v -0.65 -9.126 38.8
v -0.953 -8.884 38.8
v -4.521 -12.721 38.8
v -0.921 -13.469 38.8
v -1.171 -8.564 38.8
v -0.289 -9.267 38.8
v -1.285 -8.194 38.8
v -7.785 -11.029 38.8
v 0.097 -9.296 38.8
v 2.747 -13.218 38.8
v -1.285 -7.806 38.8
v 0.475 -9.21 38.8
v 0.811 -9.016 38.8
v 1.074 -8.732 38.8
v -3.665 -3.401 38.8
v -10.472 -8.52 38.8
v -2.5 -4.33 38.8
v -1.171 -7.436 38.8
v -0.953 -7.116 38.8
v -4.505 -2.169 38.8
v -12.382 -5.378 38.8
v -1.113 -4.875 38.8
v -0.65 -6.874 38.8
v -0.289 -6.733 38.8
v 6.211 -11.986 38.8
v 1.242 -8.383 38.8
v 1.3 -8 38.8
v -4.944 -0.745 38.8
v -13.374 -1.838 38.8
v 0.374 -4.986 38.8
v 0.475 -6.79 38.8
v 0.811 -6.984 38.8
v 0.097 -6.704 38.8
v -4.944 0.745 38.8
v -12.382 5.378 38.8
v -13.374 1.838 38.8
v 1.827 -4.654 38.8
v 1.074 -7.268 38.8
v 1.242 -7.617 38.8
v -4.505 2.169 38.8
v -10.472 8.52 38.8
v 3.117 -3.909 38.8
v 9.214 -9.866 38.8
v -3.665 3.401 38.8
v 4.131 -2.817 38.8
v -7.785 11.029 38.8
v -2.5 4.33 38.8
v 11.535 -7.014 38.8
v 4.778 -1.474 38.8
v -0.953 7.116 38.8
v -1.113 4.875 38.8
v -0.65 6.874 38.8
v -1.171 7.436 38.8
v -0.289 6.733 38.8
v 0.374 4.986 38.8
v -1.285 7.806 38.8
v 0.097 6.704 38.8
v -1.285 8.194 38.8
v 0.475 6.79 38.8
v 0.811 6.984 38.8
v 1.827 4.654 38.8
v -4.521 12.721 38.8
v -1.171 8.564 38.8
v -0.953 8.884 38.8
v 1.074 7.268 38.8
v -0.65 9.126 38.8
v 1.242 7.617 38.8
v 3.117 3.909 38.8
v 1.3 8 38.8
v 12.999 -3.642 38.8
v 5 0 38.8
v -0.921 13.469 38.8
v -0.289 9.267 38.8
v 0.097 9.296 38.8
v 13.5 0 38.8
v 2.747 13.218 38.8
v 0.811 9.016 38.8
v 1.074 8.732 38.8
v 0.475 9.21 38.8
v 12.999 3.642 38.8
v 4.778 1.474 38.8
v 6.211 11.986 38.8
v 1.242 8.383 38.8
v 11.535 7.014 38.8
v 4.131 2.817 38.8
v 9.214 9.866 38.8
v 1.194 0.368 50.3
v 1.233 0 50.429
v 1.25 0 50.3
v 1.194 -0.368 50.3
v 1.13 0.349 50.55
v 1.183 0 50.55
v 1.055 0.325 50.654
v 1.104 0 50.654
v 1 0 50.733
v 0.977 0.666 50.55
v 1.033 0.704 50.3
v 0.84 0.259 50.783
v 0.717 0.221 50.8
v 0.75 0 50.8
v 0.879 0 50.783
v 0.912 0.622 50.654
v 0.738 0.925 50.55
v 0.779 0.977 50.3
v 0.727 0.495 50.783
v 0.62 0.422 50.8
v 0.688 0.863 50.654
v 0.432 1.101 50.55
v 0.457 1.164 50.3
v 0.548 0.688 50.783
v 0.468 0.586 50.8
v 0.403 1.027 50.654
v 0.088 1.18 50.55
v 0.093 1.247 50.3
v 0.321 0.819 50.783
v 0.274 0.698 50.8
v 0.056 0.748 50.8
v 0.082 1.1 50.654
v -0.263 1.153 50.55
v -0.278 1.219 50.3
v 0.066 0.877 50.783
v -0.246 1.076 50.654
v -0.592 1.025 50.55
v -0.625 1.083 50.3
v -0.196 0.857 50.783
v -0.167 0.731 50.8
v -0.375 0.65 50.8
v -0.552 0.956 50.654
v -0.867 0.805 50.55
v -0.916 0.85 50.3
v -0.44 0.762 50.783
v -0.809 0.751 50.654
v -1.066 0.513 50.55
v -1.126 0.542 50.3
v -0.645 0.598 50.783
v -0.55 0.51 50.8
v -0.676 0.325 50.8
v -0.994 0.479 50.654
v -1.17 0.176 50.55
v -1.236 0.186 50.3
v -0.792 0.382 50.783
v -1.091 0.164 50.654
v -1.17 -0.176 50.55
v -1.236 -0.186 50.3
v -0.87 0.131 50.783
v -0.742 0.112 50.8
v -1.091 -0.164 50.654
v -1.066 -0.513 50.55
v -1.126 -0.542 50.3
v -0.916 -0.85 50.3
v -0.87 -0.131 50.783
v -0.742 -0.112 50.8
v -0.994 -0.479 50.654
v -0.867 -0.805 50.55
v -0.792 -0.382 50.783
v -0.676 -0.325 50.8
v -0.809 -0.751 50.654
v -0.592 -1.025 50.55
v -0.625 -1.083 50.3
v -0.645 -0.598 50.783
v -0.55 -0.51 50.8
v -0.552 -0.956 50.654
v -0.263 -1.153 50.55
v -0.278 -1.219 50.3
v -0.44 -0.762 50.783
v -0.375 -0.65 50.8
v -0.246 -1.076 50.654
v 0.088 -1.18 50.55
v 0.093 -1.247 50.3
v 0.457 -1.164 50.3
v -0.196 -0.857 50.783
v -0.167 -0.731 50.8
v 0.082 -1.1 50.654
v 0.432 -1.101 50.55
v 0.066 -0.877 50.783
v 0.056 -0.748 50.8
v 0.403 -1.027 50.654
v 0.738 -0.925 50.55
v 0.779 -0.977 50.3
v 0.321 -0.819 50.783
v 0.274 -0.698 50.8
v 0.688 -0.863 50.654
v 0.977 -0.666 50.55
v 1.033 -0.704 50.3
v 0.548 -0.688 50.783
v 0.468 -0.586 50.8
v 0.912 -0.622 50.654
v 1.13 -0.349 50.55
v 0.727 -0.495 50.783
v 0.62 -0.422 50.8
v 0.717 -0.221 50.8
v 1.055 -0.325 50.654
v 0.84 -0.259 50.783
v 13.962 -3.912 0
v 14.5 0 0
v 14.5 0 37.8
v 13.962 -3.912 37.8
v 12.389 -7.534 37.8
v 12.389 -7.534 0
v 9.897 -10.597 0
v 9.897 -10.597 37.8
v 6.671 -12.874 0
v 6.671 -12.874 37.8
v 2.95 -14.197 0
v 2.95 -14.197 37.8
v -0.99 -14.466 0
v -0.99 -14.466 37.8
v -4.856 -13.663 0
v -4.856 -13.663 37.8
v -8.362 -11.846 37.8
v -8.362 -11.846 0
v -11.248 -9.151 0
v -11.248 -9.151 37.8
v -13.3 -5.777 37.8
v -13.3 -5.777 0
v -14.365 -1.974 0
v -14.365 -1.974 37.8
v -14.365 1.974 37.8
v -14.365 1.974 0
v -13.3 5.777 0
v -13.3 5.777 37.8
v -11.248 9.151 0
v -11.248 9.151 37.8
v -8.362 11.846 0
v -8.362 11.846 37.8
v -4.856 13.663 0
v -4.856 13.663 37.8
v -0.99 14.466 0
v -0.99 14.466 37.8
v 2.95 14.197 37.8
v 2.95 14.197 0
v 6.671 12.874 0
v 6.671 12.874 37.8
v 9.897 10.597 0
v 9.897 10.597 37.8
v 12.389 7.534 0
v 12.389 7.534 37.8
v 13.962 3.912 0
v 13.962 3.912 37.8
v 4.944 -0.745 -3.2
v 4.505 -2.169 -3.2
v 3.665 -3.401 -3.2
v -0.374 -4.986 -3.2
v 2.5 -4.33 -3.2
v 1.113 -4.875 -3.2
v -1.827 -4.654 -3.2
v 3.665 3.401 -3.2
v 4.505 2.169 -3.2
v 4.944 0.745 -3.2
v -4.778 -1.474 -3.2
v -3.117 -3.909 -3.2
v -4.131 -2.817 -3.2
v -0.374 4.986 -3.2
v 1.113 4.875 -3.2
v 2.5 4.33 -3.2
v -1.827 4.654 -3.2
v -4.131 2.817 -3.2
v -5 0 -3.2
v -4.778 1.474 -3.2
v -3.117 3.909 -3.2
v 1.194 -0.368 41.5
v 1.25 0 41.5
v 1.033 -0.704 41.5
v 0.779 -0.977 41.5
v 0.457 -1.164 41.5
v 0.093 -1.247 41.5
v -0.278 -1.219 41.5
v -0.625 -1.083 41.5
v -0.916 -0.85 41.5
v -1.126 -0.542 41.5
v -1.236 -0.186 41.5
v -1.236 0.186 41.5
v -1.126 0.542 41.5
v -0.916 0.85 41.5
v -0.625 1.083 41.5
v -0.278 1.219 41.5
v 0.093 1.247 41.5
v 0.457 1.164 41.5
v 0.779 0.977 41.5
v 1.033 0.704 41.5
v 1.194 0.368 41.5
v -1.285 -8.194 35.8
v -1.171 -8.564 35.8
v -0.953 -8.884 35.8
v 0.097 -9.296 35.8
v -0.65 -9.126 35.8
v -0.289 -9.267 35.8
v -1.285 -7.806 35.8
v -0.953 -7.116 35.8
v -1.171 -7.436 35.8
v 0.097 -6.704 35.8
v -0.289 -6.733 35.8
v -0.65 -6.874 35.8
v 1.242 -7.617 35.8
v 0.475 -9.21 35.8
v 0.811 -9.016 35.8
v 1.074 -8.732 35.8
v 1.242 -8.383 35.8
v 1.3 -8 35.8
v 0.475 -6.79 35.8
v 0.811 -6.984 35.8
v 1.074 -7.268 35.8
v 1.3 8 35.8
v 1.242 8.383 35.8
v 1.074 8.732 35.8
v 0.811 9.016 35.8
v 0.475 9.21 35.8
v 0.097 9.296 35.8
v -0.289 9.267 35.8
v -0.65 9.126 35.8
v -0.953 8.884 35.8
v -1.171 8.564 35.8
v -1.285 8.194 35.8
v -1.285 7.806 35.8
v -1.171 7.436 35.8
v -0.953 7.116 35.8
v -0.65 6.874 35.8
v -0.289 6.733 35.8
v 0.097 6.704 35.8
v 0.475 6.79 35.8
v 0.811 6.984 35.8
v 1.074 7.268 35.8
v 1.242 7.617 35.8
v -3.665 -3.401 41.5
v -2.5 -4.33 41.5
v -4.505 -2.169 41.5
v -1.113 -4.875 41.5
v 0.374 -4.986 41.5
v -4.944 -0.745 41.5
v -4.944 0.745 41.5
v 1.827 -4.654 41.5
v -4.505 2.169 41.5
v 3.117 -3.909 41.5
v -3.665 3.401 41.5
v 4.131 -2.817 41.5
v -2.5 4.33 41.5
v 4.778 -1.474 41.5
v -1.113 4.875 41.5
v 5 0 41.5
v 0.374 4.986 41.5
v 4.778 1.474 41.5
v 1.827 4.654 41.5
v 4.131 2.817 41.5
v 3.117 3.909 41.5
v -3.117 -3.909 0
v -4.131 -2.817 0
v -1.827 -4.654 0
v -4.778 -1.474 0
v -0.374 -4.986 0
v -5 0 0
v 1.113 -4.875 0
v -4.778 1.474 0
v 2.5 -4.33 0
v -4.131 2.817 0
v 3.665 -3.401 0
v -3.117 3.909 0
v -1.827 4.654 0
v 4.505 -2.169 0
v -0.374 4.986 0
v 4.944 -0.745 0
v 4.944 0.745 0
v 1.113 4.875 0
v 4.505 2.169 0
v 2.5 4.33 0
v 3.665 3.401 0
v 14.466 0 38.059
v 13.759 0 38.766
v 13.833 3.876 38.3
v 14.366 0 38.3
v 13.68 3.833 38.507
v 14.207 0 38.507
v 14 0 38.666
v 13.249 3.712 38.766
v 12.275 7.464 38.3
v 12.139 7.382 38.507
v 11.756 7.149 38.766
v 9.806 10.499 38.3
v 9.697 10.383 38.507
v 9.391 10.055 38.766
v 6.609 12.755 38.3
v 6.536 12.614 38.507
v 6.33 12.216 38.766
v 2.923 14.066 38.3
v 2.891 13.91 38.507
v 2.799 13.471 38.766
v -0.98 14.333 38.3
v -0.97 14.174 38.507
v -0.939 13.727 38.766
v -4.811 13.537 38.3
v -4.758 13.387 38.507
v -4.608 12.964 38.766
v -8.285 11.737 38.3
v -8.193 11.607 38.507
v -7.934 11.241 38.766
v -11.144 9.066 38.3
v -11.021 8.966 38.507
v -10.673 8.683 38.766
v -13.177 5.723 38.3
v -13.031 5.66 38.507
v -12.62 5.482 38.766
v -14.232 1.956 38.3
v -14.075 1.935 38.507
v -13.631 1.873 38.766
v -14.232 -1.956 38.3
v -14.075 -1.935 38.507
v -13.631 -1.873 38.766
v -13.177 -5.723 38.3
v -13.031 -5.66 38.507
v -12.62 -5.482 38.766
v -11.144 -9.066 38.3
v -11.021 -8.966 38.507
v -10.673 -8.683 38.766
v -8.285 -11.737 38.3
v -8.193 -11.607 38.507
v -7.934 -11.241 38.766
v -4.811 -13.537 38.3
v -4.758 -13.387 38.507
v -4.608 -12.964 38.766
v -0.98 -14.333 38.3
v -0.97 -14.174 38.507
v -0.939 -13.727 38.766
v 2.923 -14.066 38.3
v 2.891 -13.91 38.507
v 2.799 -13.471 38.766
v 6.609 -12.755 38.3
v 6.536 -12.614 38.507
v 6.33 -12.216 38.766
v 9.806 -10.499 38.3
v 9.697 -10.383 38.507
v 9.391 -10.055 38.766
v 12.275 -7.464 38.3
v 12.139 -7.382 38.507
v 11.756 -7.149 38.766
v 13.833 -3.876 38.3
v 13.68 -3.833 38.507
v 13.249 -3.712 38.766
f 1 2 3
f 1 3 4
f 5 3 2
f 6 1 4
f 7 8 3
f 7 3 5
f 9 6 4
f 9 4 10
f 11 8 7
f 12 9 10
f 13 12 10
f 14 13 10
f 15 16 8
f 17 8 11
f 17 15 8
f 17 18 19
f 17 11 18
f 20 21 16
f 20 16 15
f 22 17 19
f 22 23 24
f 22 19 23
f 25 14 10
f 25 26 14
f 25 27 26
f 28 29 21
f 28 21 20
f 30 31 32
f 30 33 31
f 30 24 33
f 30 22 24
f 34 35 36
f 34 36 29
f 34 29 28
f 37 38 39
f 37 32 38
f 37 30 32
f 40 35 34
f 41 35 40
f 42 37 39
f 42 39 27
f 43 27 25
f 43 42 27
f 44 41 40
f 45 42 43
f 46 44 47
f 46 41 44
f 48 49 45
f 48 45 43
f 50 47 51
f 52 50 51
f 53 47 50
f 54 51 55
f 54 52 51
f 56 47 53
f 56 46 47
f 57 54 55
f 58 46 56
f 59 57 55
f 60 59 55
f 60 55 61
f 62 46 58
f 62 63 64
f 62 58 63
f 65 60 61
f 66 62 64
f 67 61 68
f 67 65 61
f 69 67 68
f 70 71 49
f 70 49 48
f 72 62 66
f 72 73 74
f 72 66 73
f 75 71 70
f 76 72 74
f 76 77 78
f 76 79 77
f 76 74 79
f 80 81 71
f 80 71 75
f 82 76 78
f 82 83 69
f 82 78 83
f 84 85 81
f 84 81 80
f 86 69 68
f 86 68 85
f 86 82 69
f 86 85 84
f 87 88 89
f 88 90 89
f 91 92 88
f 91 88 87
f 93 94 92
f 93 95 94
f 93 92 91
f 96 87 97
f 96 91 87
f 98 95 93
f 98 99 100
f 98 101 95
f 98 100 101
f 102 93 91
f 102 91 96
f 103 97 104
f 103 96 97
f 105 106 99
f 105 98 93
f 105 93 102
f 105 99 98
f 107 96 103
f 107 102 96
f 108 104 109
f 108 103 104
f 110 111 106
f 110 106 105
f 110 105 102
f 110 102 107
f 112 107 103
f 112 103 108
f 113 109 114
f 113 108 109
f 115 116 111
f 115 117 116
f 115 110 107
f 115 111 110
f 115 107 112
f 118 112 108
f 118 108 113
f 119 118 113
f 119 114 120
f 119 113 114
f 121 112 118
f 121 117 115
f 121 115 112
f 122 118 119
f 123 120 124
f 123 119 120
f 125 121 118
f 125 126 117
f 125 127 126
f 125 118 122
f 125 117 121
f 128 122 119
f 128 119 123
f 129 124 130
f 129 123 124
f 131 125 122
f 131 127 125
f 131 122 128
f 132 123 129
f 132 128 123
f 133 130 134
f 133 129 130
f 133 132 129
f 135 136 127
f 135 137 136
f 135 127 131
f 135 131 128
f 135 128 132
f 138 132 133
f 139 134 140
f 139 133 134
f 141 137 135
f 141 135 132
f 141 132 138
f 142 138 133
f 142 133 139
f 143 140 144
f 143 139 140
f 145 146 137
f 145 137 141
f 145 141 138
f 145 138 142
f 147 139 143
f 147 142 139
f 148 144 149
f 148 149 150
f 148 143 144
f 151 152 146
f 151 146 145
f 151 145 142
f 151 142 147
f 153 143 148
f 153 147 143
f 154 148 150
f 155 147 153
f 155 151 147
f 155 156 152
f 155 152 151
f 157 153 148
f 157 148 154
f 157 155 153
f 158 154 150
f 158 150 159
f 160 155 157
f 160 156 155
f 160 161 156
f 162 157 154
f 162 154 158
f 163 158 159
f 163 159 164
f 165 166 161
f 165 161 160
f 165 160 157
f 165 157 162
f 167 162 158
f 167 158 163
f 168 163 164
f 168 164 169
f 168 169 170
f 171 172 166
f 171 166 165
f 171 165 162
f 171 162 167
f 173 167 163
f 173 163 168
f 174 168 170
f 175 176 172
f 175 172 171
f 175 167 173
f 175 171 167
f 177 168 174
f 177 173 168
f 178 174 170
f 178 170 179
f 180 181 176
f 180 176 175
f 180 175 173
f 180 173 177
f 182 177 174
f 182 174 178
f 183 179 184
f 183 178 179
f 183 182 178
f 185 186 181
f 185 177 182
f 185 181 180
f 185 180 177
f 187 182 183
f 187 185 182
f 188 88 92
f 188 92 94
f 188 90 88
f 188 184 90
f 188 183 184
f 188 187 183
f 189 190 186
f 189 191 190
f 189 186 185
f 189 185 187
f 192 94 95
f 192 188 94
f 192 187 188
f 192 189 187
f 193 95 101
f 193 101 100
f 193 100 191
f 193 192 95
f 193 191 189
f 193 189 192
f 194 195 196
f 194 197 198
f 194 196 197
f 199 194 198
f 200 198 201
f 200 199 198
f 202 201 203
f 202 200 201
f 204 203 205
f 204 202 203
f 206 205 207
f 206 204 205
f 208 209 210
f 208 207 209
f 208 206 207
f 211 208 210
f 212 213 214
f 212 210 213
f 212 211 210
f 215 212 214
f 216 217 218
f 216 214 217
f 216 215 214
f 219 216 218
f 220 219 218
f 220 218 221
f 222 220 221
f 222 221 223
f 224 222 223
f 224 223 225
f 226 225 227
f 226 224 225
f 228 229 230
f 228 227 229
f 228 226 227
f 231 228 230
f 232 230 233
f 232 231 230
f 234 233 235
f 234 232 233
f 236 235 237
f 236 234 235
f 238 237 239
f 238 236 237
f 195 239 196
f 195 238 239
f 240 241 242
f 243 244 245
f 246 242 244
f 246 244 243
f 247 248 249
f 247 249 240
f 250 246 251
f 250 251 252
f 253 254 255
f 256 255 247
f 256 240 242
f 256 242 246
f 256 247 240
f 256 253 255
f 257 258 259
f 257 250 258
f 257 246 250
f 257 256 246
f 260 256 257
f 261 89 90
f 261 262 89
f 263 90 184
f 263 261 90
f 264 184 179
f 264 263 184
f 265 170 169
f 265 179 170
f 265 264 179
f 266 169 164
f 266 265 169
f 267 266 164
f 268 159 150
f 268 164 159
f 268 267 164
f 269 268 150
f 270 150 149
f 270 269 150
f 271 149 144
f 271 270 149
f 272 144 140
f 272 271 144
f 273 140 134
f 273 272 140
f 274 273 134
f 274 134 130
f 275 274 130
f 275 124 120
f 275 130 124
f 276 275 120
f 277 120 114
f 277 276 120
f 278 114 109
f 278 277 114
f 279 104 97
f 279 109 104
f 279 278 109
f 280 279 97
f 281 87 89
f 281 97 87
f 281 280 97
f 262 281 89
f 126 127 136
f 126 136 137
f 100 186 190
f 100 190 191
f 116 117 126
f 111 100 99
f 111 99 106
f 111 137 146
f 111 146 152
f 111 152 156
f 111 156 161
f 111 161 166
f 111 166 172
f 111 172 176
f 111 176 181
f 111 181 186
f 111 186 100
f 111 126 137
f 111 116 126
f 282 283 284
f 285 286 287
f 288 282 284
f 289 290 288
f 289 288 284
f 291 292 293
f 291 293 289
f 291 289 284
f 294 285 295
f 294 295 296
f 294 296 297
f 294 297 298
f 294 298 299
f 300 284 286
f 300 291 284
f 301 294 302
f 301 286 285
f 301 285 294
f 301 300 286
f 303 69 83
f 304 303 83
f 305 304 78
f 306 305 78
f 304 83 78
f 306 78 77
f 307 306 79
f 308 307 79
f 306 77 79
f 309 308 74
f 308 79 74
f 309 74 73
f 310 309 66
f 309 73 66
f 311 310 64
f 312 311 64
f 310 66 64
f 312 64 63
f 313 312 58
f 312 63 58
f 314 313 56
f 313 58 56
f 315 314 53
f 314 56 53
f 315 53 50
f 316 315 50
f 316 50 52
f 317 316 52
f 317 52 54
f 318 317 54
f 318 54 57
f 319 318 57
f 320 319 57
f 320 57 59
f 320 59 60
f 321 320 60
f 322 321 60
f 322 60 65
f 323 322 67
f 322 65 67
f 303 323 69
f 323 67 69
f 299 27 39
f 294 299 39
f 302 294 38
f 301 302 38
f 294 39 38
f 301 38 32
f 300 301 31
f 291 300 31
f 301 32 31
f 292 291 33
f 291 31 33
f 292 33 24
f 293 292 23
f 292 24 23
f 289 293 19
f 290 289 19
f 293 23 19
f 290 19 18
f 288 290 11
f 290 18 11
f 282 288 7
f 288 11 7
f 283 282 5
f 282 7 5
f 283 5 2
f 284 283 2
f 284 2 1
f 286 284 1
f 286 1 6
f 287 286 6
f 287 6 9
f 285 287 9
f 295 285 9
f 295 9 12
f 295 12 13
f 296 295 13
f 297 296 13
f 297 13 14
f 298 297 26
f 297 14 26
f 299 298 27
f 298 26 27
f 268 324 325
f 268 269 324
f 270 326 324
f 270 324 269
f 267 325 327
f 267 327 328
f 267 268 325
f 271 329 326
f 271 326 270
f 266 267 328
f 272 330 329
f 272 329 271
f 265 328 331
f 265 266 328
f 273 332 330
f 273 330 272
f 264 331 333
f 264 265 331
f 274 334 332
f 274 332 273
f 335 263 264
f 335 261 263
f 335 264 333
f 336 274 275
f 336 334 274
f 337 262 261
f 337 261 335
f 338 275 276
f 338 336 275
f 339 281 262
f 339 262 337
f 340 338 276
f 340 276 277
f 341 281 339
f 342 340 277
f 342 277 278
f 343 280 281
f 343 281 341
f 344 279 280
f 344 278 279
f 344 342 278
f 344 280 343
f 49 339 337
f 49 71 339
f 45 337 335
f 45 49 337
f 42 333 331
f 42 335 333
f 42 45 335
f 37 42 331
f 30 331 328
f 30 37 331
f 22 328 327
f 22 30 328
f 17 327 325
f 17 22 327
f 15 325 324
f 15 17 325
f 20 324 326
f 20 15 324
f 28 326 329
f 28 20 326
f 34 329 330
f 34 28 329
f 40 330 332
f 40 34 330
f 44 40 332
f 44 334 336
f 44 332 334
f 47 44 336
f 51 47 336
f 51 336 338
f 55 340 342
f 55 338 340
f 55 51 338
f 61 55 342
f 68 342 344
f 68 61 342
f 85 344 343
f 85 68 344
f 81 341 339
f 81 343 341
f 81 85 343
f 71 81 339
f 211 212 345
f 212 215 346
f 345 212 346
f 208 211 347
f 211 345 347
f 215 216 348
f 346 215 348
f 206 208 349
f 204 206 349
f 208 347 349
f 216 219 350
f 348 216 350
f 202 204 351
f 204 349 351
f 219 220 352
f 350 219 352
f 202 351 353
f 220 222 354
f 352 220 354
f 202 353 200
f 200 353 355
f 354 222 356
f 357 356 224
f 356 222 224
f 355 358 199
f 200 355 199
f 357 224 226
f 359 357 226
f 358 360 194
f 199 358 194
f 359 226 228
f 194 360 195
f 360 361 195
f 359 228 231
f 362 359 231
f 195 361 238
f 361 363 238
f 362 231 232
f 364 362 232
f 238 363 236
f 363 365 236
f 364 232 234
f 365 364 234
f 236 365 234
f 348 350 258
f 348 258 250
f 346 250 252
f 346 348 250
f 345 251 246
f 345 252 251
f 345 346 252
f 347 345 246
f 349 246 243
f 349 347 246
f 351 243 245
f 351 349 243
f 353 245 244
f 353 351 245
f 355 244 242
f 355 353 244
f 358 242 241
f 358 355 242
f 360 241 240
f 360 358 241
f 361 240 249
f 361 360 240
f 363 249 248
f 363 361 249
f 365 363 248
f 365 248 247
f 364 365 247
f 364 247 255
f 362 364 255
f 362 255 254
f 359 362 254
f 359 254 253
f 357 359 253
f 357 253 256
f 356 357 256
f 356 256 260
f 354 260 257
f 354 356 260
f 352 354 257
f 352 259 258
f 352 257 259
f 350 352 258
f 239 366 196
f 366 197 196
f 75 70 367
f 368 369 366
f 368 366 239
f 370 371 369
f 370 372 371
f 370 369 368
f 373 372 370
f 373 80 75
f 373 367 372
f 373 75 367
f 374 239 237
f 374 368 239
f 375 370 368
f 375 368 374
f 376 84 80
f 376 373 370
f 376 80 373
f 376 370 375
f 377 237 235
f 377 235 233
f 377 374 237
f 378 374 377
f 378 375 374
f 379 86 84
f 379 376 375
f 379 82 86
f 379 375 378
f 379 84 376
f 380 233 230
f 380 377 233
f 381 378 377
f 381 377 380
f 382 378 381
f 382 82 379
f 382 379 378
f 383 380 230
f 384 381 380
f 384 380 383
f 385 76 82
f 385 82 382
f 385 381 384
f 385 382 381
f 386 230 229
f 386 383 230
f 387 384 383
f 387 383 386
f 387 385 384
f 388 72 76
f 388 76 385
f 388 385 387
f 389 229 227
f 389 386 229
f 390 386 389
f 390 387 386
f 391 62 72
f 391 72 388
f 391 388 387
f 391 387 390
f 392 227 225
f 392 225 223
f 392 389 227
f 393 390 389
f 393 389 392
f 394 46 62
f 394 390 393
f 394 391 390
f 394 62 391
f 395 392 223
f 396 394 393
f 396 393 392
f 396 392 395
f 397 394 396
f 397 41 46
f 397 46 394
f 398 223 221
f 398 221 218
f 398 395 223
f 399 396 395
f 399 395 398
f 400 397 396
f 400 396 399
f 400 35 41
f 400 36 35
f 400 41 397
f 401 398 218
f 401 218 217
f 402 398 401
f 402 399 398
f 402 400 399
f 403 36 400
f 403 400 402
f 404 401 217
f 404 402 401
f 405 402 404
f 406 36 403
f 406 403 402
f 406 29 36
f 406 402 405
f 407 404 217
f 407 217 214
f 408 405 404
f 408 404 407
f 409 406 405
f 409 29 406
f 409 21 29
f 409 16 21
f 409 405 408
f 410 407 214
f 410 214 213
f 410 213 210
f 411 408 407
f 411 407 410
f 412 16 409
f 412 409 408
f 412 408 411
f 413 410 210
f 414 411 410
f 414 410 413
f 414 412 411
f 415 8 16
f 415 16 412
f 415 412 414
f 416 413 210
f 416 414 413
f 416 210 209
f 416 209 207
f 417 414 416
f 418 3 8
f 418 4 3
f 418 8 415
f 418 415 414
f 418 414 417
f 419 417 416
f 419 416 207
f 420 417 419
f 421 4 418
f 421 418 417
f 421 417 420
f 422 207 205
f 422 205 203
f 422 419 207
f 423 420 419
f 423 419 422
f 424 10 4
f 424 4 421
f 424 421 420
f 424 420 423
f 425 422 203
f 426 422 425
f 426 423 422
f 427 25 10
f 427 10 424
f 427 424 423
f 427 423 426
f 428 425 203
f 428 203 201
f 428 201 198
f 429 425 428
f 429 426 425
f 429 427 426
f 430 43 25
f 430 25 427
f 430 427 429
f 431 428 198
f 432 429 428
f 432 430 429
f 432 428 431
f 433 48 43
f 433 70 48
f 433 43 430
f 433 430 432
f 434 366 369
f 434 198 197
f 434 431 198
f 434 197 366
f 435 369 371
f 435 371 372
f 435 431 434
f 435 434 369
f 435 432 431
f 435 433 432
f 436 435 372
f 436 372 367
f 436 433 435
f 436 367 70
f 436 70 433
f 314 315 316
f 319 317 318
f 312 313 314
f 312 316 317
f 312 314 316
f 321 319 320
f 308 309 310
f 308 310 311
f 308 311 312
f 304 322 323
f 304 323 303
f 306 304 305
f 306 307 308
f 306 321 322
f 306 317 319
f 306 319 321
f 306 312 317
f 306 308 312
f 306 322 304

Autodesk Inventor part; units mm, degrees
ref_plane "YZ Plane" through (0, 0, 0) normal (1, 0, 0) x (0, 1, 0)
ref_plane "XZ Plane" through (0, 0, 0) normal (0, 1, 0) x (-1, 0, 0)
ref_plane "XY Plane" through (0, 0, 0) normal (0, 0, 1) x (1, 0, 0)
sketch "Esquisse1" plane through (0, 0, 0) normal (0, 0, 1) x (1, 0, 0)
  circle A0 centre (0, 0) radius 14.5
  dimension "d0" = 29
extrude "Extrusion1" add sketch "Esquisse1" along normal blind 38.8
sketch "Esquisse2" plane through (0, 0, 38.8) normal (0, 0, 1) x (1, 0, 0)
  circle A0 centre (0, 0) radius 14.5 projected
  circle A1 centre (0, 0) radius 5
  dimension "d3" = 10
extrude "Extrusion2" add sketch "Esquisse2" along normal blind 2.7 contours A1
sketch "Esquisse3" plane through (0, 0, 41.5) normal (0, 0, 1) x (1, 0, 0)
  circle A0 centre (0, 0) radius 5 projected
  circle A1 centre (0, 0) radius 1.25
  dimension "d6" = 2.5
extrude "Extrusion3" add sketch "Esquisse3" along normal blind 9.3 contours A1
sketch "Esquisse4" plane through (0, 0, 0) normal (0, 0, -1) x (-1, 0, 0)
  circle A0 centre (0, 0) radius 14.5 projected
  circle A1 centre (0, 0) radius 5
  dimension "d9" = 10
extrude "Extrusion4" add sketch "Esquisse4" along normal blind 3.2 contours A1
fillet "Congé1" radius 1 1 edges at (-14.5, 0, 38.8)
fillet "Congé2" radius 0.5 1 edges at (-1.25, 0, 50.8)
sketch "Esquisse5" plane through (0, 0, 38.8) normal (0, 0, 1) x (1, 0, 0)
  circle A0 centre (0, 0) radius 5 projected
  circle A1 centre (0, 8) radius 1.3
  circle A2 centre (0, -8) radius 1.3
  dimension "d14" = 2.6
  dimension "d15" = 8
  dimension "d16" = 2.6
  dimension "d17" = 8
extrude "Extrusion5" cut sketch "Esquisse5" against normal blind 3 contours A1 | A2
thread "Filetage1" size "M3x0.5" class "6H" standard "ANSI Metric M Profile" full length
thread "Filetage2" size "M3x0.5" class "6H" standard "ANSI Metric M Profile" full length
equation "\"d16\" = d14"
equation "\"d17\" = d15"
properties part number "Nidec_DMN29"
